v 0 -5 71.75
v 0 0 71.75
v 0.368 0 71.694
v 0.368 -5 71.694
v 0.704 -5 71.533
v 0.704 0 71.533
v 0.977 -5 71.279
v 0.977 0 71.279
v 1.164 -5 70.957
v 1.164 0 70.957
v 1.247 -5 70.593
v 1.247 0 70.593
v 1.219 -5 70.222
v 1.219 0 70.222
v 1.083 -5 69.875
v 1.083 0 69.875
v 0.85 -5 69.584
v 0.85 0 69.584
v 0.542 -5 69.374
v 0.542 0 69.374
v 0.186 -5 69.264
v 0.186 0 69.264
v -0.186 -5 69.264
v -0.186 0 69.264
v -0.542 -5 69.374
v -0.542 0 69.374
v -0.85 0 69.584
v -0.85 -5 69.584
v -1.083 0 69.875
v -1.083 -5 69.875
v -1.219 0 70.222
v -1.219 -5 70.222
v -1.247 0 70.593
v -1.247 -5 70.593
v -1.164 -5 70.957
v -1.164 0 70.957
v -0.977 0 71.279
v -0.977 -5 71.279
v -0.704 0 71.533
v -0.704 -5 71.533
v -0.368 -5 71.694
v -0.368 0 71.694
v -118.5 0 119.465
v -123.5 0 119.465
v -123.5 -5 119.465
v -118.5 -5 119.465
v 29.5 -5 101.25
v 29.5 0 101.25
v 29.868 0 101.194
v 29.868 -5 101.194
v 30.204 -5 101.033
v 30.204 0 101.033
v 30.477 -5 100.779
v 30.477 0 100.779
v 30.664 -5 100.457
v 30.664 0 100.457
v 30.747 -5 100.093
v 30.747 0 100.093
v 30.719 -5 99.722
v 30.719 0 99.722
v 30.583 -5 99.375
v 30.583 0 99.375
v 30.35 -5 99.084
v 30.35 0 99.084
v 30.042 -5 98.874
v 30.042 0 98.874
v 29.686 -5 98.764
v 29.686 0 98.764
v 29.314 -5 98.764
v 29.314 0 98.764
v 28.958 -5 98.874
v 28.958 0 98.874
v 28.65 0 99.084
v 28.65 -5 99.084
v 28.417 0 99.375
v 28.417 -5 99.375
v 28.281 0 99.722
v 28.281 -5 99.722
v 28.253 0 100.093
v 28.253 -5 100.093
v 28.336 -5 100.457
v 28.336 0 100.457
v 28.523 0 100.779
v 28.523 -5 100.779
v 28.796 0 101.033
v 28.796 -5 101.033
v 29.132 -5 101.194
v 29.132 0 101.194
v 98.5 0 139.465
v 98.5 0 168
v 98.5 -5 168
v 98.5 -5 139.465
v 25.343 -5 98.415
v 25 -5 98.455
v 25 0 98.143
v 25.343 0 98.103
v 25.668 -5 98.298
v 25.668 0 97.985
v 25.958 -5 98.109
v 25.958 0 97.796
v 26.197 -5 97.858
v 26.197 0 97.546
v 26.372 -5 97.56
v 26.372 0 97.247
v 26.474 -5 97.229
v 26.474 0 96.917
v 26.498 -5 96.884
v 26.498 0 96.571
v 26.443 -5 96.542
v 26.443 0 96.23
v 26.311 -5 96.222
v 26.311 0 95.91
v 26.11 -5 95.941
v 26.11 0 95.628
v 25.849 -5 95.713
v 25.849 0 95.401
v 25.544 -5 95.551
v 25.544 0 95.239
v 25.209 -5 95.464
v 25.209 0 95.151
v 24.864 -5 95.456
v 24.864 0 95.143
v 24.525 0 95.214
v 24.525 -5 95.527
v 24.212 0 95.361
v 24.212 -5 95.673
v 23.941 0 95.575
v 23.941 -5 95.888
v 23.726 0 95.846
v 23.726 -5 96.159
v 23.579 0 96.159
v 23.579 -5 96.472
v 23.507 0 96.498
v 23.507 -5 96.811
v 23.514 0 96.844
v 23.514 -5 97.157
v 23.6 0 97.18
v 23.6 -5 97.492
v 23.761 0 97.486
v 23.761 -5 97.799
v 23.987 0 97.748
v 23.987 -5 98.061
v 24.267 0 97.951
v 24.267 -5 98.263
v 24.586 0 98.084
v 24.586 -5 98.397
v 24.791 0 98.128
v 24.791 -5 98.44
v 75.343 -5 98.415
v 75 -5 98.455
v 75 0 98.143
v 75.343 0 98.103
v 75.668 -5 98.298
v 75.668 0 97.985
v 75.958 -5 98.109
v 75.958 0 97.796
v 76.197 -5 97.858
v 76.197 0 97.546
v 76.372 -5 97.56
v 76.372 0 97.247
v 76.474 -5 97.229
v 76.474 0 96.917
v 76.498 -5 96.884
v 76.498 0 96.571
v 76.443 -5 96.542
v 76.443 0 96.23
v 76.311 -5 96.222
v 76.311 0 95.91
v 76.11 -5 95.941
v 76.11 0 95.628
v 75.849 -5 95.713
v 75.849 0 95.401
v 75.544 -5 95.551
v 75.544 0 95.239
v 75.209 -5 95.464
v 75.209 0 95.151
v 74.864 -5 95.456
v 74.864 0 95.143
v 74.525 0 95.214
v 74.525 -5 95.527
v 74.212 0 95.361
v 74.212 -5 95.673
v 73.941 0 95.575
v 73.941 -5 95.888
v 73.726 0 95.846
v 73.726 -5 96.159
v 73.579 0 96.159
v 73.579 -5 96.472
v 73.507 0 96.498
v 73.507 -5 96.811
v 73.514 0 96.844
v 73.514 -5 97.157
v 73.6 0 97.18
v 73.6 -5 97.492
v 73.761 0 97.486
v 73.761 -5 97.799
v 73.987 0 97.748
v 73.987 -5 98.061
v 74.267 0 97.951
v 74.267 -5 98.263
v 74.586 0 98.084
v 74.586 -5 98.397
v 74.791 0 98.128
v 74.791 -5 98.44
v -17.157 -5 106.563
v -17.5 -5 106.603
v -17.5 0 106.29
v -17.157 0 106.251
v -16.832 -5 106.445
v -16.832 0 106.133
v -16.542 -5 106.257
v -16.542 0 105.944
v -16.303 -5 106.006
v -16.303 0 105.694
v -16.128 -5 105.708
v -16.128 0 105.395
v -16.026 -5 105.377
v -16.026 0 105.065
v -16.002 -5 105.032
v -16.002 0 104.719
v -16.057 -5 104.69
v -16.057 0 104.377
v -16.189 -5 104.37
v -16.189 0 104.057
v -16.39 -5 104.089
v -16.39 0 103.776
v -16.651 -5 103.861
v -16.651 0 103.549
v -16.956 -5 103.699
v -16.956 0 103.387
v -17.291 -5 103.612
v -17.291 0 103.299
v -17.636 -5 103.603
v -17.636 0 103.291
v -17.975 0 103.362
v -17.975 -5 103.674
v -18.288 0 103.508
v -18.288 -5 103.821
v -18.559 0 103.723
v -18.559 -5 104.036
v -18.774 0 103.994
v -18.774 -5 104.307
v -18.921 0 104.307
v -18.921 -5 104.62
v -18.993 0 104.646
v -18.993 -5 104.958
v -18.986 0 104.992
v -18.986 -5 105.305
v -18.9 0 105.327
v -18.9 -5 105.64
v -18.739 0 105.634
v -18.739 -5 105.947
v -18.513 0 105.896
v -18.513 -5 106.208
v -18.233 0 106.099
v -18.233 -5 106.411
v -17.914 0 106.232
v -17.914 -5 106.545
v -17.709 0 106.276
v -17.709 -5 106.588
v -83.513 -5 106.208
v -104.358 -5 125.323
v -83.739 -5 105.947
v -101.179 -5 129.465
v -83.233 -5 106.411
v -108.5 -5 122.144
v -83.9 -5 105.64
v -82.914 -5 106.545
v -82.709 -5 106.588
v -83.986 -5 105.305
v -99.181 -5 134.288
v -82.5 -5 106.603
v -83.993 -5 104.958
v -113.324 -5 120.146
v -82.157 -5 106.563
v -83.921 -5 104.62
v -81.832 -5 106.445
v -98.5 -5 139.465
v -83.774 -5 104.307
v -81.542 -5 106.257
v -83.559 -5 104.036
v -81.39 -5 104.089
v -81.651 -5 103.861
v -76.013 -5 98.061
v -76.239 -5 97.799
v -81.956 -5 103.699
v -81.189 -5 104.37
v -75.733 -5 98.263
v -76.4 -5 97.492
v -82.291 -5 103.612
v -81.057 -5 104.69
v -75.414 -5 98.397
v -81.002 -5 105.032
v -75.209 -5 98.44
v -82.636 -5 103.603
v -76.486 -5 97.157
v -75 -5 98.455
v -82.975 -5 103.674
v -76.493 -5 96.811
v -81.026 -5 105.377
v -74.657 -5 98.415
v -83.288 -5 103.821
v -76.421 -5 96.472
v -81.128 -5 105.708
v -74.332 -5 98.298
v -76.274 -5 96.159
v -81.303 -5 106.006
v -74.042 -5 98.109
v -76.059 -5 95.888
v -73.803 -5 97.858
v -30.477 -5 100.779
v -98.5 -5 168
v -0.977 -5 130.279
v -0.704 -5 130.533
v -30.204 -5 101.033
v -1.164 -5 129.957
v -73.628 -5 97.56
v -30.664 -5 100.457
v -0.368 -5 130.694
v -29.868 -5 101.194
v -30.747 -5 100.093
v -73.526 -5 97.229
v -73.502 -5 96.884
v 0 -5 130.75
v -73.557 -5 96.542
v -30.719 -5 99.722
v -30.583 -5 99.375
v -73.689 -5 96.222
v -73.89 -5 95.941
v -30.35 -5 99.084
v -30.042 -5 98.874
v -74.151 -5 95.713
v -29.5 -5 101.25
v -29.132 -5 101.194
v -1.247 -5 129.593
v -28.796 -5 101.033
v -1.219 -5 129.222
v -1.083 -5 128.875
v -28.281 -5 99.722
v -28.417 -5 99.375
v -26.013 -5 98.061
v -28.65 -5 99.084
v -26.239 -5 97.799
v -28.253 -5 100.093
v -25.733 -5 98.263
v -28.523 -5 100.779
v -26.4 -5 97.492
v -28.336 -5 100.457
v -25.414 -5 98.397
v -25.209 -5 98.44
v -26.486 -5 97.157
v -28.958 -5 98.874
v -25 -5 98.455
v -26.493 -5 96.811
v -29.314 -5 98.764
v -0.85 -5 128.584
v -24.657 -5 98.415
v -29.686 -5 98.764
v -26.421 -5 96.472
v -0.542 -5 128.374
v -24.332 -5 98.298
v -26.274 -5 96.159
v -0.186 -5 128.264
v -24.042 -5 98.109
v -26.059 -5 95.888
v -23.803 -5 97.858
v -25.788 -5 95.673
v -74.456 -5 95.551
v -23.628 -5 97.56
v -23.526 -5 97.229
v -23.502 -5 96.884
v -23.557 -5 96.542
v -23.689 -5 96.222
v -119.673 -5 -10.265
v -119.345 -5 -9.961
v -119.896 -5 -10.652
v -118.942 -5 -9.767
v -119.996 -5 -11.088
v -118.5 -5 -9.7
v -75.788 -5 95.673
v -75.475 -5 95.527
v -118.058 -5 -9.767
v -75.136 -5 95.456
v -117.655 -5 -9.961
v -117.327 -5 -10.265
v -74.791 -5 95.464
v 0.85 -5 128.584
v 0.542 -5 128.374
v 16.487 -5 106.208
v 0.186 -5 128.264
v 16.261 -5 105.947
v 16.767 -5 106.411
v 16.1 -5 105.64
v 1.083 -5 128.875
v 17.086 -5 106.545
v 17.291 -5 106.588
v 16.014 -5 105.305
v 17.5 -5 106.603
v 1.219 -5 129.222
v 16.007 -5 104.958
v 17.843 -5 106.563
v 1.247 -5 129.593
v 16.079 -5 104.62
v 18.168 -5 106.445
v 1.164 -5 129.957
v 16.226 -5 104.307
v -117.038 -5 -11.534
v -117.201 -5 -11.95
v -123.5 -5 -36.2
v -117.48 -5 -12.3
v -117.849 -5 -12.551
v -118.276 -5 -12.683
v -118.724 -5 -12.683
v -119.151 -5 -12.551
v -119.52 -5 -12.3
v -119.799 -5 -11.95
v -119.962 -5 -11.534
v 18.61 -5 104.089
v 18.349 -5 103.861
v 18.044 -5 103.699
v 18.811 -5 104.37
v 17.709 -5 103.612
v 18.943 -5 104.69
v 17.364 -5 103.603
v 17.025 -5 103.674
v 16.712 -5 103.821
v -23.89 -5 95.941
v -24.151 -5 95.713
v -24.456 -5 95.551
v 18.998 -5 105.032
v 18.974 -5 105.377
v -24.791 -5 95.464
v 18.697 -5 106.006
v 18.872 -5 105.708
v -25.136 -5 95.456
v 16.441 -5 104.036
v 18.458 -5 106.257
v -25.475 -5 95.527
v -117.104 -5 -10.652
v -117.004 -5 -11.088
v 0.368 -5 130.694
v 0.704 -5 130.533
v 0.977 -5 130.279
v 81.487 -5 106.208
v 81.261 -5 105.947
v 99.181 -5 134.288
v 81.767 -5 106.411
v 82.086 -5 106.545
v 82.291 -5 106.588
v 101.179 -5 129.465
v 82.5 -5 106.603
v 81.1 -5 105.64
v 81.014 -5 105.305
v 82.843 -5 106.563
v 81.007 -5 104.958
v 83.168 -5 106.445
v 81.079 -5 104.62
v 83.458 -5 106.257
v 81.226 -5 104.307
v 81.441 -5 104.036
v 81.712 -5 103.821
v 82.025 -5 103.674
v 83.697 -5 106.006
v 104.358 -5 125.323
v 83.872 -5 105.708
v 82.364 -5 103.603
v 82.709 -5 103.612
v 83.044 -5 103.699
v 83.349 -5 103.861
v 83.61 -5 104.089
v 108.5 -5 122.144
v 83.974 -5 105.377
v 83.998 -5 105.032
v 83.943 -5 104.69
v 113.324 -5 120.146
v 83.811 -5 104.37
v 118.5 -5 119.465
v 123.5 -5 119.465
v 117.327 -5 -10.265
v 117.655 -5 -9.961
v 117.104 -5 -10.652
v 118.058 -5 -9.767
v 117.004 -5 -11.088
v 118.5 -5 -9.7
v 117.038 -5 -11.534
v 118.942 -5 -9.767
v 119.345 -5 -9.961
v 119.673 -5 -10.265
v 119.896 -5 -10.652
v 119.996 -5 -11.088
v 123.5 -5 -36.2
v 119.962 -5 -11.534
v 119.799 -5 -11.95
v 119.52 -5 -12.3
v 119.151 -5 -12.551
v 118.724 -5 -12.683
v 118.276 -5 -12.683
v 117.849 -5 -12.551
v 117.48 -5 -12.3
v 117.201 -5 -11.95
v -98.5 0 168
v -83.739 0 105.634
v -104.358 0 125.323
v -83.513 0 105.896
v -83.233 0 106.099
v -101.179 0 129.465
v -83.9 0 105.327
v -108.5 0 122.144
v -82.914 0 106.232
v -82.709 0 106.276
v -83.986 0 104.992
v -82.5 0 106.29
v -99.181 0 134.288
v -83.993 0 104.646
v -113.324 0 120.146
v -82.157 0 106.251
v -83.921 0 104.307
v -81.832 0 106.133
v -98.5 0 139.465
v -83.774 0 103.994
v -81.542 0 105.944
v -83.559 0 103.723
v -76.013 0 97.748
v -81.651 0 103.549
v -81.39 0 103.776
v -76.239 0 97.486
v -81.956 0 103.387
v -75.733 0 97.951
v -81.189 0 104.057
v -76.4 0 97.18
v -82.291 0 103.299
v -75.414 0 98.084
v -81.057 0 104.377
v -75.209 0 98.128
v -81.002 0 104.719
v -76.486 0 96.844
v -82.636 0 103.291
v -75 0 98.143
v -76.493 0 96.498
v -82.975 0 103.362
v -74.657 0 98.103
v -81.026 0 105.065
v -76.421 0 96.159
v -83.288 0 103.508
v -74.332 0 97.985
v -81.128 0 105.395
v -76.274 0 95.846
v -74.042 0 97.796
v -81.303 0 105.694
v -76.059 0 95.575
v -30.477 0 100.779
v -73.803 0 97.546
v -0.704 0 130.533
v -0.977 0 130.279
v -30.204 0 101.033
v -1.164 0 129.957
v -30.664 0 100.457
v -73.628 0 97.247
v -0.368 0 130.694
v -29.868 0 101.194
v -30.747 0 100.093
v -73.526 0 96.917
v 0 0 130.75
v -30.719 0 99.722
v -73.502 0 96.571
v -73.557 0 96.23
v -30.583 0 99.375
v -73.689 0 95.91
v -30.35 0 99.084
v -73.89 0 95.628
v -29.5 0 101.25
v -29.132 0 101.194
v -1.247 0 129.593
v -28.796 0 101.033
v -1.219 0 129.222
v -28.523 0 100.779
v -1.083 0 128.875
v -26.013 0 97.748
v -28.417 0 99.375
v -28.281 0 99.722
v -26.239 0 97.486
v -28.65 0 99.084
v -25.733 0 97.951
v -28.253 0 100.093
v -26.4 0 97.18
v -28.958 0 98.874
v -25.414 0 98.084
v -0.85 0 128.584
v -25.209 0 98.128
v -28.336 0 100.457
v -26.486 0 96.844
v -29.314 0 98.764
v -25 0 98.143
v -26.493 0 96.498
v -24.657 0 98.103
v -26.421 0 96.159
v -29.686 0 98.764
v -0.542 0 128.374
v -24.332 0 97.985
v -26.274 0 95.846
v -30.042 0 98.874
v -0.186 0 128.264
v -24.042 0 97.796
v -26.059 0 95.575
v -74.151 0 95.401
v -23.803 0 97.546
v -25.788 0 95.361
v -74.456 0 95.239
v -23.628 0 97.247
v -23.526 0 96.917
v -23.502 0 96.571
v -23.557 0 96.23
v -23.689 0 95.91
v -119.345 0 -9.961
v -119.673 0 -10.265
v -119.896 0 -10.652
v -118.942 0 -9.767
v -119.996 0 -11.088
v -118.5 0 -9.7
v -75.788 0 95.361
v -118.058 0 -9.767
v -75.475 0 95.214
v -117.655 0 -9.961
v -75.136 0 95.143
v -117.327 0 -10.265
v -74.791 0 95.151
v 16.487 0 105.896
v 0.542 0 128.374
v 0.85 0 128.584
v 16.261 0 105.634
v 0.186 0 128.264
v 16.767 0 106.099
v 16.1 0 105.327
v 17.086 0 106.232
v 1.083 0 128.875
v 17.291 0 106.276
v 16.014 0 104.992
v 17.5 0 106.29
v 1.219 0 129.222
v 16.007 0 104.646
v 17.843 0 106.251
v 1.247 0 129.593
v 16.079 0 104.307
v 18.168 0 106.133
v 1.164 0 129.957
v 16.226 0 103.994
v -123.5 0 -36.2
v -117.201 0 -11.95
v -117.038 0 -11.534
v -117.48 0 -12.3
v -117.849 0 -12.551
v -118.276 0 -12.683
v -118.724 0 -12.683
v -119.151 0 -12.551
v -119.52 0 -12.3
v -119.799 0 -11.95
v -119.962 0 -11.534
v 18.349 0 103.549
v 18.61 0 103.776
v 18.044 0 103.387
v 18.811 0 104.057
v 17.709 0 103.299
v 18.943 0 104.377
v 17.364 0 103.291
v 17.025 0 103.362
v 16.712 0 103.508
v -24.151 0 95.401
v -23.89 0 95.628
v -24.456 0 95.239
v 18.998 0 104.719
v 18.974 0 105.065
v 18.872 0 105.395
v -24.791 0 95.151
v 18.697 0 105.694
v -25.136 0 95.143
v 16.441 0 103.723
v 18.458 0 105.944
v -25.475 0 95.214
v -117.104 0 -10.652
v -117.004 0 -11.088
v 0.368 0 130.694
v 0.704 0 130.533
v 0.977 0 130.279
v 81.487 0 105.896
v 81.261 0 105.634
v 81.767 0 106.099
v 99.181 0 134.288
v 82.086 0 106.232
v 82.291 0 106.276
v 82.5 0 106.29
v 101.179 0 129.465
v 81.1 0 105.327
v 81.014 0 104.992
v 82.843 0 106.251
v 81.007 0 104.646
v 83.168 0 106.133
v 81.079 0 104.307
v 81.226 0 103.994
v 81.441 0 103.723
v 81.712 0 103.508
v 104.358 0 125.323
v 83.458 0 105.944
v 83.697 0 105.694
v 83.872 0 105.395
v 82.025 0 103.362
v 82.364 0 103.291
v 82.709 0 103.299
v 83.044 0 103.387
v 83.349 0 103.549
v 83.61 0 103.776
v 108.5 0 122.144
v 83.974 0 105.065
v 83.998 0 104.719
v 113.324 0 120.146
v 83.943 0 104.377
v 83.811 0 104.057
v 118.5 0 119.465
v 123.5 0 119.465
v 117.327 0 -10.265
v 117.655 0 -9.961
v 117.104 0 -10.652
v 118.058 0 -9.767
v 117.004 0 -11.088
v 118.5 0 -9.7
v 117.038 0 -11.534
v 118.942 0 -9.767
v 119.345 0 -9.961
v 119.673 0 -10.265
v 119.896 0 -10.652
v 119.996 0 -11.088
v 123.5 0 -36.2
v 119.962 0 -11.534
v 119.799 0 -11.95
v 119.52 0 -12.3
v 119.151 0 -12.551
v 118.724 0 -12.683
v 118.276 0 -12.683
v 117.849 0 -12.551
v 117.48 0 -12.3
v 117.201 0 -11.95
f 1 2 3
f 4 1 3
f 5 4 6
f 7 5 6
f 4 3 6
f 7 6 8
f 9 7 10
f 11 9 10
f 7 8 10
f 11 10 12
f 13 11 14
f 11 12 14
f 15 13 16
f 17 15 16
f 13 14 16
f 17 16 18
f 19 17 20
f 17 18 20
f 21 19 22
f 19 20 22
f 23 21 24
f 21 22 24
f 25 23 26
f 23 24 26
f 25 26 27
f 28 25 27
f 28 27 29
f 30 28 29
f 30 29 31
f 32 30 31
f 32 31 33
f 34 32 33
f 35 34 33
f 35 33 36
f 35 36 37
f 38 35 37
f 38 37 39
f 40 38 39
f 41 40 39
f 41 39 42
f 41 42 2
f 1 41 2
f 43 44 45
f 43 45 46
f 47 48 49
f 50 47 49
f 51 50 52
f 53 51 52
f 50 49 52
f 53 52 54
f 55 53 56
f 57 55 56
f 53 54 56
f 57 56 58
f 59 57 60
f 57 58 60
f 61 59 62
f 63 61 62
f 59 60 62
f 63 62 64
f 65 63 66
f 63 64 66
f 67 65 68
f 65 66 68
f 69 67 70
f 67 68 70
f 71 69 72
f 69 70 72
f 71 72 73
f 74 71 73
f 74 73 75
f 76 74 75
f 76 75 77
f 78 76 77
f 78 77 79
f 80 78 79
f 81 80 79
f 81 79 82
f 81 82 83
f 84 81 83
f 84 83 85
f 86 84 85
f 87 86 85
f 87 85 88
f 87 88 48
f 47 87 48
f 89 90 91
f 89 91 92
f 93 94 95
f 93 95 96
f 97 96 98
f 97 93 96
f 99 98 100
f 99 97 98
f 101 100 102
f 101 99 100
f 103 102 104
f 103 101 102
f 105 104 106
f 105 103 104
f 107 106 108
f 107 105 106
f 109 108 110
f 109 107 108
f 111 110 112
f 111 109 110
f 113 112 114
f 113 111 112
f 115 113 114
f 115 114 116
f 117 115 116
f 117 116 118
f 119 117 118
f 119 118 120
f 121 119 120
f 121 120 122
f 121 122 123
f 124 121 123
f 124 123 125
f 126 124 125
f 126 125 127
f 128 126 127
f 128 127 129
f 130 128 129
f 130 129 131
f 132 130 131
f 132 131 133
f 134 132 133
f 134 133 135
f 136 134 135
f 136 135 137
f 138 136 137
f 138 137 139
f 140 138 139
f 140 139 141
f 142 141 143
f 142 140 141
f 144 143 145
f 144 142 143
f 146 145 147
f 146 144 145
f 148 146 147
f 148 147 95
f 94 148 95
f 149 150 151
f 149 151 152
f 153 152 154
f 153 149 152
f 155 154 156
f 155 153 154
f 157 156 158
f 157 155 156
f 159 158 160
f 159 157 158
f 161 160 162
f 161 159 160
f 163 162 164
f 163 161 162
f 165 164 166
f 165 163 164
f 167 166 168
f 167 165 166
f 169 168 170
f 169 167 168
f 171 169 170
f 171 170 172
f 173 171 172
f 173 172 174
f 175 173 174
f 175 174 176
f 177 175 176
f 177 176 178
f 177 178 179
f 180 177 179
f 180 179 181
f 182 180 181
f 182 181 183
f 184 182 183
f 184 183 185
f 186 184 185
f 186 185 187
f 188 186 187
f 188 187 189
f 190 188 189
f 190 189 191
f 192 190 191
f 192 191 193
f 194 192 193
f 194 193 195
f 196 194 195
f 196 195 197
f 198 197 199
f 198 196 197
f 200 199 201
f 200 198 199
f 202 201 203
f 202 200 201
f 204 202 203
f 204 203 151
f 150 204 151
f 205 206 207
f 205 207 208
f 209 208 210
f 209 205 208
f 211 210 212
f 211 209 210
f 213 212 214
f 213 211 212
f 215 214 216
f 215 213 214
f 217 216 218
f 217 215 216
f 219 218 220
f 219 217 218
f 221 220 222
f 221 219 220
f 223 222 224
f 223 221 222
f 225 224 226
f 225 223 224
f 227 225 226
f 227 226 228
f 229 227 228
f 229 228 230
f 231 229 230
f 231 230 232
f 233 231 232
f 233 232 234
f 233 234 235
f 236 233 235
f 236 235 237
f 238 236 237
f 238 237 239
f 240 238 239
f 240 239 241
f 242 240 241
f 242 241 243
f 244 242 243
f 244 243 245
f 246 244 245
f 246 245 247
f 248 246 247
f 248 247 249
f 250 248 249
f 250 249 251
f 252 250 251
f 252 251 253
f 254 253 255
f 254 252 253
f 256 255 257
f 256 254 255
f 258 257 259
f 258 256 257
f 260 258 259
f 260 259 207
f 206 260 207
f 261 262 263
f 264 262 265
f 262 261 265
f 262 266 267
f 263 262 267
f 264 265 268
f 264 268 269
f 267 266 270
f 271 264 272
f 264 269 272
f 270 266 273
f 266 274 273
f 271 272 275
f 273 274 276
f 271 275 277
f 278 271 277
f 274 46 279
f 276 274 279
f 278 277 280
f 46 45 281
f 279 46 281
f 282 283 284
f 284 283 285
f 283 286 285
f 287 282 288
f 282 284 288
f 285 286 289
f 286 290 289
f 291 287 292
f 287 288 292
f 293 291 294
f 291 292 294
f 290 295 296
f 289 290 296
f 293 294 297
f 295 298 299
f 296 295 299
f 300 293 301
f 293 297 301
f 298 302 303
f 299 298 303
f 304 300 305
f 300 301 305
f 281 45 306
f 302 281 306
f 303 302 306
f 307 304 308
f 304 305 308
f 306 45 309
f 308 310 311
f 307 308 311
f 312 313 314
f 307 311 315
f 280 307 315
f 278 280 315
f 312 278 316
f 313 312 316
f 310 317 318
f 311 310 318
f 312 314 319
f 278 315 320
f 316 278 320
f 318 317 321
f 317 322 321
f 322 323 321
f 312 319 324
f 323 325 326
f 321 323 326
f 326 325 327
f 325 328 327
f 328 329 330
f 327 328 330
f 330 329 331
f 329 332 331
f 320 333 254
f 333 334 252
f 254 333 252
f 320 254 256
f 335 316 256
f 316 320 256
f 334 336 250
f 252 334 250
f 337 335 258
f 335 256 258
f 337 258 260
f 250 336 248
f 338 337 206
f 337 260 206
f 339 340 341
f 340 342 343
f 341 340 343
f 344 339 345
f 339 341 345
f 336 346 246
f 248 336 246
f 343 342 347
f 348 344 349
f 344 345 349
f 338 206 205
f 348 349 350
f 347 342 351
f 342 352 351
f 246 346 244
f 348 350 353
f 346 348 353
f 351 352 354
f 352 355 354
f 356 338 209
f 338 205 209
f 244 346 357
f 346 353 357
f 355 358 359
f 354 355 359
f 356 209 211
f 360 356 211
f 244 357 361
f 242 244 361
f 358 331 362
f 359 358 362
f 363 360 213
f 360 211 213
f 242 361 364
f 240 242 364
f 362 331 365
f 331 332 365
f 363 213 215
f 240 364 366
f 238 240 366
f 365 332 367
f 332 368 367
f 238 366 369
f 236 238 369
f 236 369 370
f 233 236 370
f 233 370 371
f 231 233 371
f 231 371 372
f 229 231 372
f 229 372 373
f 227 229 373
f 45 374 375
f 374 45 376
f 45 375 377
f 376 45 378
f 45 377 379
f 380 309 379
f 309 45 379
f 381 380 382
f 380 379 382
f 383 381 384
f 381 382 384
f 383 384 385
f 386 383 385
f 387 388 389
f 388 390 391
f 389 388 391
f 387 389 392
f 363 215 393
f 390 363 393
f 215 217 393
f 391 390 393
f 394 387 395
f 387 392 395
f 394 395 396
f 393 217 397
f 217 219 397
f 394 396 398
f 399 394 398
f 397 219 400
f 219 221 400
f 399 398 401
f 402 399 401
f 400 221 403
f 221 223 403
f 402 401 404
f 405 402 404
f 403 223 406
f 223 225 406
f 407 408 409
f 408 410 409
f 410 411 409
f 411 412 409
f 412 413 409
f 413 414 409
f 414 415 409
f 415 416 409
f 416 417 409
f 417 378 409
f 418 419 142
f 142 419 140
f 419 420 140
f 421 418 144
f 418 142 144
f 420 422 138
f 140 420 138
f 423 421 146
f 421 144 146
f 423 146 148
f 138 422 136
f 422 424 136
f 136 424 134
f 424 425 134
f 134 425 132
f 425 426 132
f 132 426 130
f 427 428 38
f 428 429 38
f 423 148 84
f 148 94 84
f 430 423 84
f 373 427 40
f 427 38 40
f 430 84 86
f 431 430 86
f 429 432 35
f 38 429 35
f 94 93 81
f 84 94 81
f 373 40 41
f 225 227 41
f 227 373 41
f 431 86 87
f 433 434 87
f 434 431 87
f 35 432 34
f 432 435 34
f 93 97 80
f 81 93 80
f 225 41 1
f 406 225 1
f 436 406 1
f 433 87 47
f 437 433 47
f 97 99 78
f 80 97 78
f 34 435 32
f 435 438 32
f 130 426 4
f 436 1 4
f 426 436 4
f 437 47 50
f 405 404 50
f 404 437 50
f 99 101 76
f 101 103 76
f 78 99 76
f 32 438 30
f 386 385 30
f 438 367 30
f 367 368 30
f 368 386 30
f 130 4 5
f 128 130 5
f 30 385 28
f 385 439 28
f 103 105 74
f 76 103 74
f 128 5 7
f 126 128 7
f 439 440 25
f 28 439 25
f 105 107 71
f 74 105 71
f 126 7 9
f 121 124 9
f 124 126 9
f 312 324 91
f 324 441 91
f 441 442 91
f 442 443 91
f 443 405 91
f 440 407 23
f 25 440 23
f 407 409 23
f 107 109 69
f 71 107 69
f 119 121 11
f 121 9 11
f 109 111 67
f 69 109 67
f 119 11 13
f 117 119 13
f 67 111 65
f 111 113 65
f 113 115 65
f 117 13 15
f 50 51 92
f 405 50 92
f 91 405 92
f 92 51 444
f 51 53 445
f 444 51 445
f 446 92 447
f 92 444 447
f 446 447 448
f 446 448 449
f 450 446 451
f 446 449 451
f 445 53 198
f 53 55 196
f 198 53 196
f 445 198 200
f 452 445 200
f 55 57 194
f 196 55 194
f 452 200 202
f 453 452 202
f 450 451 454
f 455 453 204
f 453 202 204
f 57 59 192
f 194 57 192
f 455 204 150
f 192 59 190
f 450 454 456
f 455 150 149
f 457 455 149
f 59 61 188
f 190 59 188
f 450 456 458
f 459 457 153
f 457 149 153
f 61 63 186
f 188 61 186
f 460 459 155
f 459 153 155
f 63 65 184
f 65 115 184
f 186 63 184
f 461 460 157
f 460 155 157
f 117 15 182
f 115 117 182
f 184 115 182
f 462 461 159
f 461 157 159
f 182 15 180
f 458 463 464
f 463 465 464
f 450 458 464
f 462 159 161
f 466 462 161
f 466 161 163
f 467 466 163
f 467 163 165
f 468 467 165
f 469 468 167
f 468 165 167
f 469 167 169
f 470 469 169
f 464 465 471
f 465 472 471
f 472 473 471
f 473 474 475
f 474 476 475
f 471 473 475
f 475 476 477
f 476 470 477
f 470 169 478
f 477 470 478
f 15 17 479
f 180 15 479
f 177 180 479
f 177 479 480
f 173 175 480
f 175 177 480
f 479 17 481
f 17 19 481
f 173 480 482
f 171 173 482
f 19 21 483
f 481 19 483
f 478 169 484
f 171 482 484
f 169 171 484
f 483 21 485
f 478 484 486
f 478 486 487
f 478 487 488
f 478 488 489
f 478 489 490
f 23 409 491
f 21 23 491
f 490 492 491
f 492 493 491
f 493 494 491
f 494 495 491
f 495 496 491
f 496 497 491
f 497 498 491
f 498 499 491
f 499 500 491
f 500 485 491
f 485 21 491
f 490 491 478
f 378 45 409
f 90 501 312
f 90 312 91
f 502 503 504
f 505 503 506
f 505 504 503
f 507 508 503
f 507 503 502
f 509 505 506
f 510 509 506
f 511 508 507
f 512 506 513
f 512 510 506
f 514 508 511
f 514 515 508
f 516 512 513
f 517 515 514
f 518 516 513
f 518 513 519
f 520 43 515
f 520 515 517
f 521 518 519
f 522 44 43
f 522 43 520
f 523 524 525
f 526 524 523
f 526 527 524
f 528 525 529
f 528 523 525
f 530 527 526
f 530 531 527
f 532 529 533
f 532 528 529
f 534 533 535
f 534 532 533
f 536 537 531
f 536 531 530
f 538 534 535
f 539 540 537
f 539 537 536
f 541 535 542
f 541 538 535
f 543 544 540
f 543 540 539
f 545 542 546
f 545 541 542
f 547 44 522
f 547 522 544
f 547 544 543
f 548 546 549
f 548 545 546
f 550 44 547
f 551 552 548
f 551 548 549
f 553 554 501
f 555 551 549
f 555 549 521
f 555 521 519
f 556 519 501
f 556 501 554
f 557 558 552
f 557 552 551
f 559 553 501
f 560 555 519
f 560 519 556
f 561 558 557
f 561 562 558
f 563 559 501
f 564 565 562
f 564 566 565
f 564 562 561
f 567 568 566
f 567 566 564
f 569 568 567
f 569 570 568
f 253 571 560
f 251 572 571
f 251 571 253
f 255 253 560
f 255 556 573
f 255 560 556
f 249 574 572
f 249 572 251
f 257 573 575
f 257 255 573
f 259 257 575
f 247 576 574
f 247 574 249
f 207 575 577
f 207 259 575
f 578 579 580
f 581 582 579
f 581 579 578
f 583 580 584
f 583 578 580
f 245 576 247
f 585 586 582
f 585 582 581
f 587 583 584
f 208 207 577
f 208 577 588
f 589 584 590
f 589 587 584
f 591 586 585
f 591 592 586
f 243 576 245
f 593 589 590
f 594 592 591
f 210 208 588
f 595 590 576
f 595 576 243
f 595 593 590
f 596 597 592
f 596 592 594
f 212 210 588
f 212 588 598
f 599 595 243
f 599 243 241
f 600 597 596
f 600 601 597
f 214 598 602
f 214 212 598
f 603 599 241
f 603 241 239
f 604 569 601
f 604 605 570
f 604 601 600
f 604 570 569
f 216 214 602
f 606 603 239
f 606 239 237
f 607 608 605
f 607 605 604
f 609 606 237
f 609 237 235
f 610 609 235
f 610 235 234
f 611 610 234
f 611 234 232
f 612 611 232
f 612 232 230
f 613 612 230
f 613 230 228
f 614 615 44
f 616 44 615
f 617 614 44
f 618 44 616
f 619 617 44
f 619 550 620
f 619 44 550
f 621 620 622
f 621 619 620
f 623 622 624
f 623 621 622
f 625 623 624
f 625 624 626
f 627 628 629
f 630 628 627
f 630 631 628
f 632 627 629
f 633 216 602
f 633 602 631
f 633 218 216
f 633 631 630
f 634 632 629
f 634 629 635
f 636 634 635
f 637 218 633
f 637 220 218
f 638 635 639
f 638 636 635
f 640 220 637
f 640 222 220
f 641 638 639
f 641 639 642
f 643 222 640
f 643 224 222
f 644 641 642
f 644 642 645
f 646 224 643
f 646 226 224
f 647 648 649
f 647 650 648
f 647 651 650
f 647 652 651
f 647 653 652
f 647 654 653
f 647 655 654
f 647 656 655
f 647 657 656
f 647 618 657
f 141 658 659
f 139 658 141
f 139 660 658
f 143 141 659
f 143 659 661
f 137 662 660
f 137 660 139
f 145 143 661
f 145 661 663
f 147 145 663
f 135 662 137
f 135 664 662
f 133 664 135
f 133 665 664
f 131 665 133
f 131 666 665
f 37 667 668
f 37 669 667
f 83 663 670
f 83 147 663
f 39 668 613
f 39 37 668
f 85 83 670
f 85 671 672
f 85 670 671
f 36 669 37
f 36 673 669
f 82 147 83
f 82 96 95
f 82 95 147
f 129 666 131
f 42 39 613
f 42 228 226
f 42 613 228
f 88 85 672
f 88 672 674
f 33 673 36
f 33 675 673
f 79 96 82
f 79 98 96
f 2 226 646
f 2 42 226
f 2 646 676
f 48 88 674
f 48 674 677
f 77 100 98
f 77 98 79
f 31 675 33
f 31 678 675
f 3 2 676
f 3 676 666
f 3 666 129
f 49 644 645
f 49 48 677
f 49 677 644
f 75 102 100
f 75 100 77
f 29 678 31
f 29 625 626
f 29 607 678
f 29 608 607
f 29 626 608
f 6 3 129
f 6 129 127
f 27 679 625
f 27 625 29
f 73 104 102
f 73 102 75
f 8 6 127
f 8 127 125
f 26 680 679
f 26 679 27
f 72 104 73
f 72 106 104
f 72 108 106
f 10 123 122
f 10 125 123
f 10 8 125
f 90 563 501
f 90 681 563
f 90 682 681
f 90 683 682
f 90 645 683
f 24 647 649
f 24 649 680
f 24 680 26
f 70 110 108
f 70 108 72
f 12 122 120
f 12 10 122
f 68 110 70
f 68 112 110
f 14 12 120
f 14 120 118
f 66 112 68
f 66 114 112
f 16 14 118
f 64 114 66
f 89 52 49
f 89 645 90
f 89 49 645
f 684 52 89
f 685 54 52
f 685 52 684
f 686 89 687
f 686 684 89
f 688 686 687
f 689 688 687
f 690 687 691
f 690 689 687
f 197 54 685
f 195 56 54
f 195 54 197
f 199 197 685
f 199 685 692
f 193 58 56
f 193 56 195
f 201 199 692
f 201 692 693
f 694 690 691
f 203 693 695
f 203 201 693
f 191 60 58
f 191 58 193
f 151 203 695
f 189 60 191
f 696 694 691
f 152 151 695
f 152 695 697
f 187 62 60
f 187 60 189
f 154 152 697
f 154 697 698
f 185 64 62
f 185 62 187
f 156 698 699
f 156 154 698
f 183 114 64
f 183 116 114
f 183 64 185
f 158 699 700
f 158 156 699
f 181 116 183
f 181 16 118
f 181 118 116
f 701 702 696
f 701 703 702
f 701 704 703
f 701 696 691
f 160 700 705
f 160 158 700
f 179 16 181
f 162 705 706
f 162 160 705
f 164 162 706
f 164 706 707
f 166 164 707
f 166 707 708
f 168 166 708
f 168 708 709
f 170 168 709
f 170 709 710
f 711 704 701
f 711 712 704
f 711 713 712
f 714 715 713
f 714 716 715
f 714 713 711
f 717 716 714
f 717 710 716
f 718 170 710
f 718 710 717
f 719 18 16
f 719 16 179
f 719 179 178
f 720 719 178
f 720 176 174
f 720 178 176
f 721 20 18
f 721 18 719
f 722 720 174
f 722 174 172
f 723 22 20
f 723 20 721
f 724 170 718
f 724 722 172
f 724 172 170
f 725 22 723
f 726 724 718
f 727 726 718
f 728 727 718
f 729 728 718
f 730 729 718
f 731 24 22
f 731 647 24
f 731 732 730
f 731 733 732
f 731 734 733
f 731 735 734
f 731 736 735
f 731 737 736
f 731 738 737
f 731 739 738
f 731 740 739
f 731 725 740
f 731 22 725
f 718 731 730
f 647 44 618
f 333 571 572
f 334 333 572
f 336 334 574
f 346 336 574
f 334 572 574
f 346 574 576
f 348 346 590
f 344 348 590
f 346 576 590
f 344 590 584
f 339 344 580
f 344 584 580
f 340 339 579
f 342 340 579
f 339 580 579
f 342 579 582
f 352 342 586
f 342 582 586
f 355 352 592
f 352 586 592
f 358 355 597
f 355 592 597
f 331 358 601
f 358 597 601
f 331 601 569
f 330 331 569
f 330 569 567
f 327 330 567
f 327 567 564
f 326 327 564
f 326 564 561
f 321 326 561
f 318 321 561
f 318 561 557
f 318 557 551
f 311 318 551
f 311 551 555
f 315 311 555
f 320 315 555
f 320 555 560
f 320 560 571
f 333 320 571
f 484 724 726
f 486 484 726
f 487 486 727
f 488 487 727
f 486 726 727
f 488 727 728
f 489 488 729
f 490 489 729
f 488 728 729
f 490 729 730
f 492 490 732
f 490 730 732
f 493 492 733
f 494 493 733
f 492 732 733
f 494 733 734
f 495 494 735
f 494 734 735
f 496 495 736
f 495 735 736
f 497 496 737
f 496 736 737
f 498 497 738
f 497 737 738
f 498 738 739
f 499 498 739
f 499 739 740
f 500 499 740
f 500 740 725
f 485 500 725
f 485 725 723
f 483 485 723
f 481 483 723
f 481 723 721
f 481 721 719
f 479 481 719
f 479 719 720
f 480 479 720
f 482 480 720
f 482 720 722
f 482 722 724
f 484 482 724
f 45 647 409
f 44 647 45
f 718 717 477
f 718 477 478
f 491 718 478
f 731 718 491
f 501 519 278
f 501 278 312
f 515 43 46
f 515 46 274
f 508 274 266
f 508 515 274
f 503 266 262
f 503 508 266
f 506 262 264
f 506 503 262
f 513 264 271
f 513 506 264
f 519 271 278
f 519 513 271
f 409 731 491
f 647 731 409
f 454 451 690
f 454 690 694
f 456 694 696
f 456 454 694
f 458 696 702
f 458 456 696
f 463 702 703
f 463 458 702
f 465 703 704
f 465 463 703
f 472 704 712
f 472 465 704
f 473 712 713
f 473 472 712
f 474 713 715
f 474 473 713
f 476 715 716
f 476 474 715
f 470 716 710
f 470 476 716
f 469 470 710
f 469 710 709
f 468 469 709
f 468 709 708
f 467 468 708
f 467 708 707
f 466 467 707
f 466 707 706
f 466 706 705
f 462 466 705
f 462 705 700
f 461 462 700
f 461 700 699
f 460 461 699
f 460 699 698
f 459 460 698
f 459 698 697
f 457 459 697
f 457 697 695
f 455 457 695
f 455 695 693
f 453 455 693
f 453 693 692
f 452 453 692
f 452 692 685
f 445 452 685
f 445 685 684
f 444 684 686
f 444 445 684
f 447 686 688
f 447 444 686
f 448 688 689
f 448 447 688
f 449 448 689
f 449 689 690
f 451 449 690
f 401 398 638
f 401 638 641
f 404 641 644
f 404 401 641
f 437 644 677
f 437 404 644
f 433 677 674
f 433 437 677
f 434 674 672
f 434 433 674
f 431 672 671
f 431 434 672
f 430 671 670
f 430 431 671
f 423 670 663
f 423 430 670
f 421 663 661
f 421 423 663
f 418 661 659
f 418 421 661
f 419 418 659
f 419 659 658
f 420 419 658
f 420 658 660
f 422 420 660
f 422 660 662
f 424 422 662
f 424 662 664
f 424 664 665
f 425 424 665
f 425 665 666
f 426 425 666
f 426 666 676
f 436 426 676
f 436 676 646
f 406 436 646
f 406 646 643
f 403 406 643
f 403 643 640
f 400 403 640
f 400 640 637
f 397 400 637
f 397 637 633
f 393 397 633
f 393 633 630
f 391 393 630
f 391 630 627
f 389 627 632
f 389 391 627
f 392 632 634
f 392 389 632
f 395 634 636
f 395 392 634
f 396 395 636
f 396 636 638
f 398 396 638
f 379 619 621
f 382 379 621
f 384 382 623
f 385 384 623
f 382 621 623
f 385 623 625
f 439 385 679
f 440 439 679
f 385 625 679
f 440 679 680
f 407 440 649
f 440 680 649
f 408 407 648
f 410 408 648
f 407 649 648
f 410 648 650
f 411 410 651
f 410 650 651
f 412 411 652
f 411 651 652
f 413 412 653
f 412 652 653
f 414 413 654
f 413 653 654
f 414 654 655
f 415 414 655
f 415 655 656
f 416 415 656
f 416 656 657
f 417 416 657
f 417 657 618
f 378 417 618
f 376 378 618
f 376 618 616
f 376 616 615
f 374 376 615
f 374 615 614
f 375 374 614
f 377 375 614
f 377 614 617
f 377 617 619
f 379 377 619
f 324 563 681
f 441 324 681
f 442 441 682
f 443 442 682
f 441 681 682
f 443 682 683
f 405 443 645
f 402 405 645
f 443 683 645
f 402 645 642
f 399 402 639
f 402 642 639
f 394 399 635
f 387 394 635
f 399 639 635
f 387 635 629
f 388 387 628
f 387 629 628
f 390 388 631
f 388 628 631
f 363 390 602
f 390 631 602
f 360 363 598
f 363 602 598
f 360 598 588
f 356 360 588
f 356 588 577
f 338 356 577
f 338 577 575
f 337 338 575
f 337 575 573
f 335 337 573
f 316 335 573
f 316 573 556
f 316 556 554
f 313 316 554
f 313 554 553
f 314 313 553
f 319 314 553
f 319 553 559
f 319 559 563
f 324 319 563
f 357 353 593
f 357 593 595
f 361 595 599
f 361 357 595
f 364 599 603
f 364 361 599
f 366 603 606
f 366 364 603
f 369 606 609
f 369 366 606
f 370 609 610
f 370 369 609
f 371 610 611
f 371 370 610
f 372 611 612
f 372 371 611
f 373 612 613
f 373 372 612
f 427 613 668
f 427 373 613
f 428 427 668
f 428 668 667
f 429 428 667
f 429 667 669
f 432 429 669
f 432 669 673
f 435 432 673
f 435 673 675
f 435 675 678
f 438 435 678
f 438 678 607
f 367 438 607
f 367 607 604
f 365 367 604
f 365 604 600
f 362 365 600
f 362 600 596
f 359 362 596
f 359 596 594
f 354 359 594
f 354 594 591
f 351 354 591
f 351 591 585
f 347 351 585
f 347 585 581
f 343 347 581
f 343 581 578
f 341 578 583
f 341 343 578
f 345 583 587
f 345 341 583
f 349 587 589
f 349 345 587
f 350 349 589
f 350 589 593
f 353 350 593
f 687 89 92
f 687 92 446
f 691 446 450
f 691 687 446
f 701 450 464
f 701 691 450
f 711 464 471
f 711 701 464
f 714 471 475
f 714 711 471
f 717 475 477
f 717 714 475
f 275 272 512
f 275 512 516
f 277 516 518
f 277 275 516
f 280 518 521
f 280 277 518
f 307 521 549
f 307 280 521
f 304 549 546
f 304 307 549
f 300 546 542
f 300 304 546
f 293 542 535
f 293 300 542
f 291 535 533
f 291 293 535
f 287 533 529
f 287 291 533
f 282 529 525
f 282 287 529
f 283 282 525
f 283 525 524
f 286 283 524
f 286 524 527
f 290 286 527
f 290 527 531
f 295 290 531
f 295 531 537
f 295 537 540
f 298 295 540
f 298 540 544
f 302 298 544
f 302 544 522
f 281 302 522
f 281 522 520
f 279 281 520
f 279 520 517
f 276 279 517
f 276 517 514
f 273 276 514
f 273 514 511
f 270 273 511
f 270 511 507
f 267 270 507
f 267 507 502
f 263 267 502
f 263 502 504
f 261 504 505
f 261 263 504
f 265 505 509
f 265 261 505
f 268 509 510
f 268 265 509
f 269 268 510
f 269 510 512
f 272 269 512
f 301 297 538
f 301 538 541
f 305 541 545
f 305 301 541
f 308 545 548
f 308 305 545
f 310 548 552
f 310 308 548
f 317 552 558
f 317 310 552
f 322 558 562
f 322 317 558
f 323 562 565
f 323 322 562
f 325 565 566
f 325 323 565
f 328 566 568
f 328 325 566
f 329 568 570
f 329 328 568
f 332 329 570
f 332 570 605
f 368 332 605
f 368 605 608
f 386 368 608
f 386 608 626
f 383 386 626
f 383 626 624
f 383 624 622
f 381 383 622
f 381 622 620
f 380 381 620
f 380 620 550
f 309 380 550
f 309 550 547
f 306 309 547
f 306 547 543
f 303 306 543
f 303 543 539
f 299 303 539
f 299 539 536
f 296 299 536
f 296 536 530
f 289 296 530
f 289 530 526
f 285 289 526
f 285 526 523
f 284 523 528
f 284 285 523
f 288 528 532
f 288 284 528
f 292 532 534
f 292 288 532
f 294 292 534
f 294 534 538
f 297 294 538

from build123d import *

# Parameters (mm, degrees)
BOSS_EXTRU_1_DEPTH      = 5
ESQUISSE2_R             = 1.5
ENL_V_MAT_EXTRU_1_DEPTH = 209.56953277
ESQUISSE4_R             = 1.25
ENL_V_MAT_EXTRU_3_DEPTH = 209.56953277
ESQUISSE5_R             = 1.5
ENL_V_MAT_EXTRU_6_DEPTH = 269.378676152


with BuildPart() as part:
    # Esquisse1 → Boss.-Extru.1 (new body)
    with BuildSketch(Plane(origin=(0, 0, 0), x_dir=(1, 0, 0), z_dir=(0, 1, 0))):
        with BuildLine():
            Line((123.5, -119.464880645), (123.5, 36.2))
            Line((123.5, 36.2), (-123.5, 36.2))
            Line((-123.5, 36.2), (-123.5, -119.464880645))
            Line((-123.5, -119.464880645), (-118.5, -119.464880645))
            ThreePointArc((-118.5, -119.464880645), (-104.357864376, -125.322745021), (-98.5, -139.464880645))
            Line((-98.5, -139.464880645), (-98.5, -168))
            Line((-98.5, -168), (98.5, -168))
            Line((98.5, -168), (98.5, -139.464880645))
            ThreePointArc((98.5, -139.464880645), (104.357864376, -125.322745021), (118.5, -119.464880645))
            Line((118.5, -119.464880645), (123.5, -119.464880645))
        make_face()
    extrude(amount=-BOSS_EXTRU_1_DEPTH)

    # Esquisse2 → Enlèv. mat.-Extru.1 (cut, through all)
    with BuildSketch(Plane(origin=(0, 0, 0), x_dir=(1, 0, 0), z_dir=(0, 1, 0))):
        with Locations(Location((-118.5, 11.2, 0), (0, 0, 270))):
            Circle(ESQUISSE2_R)
        with Locations(Location((118.5, 11.2, 0), (0, 0, 270))):
            Circle(ESQUISSE2_R)
    extrude(amount=-ENL_V_MAT_EXTRU_1_DEPTH, mode=Mode.SUBTRACT)

    # Esquisse4 → Enlèv. mat.-Extru.3 (cut, through all)
    with BuildSketch(Plane(origin=(0, 0, 0), x_dir=(1, 0, 0), z_dir=(0, 1, 0))):
        with Locations(Location((0, -129.5, 0), (0, 0, 270))):
            Circle(ESQUISSE4_R)
        with Locations(Location((29.5, -100, 0), (0, 0, 270))):
            Circle(ESQUISSE4_R)
        with Locations(Location((-29.5, -100, 0), (0, 0, 270))):
            Circle(ESQUISSE4_R)
        with Locations(Location((0, -70.5, 0), (0, 0, 270))):
            Circle(ESQUISSE4_R)
    extrude(amount=-ENL_V_MAT_EXTRU_3_DEPTH, mode=Mode.SUBTRACT)

    # Esquisse5 → Enlèv. mat.-Extru.6 (cut, through all)
    with BuildSketch(Plane(origin=(0, -179.424124514, 11.214007782), x_dir=(1, 0, 0), z_dir=(0, 0.9980525784828886, -0.06237828615518076))):
        with Locations(Location((-17.5, -104.583435434, 0), (0, 0, 270))):
            Circle(ESQUISSE5_R)
        with Locations(Location((-25, -96.451522388, 0), (0, 0, 270))):
            Circle(ESQUISSE5_R)
        with Locations(Location((-82.5, -104.583435434, 0), (0, 0, 270))):
            Circle(ESQUISSE5_R)
        with Locations(Location((-75, -96.451522388, 0), (0, 0, 270))):
            Circle(ESQUISSE5_R)
        with Locations(Location((17.5, -104.583435434, 0), (0, 0, 270))):
            Circle(ESQUISSE5_R)
        with Locations(Location((25, -96.451522388, 0), (0, 0, 270))):
            Circle(ESQUISSE5_R)
        with Locations(Location((75, -96.451522388, 0), (0, 0, 270))):
            Circle(ESQUISSE5_R)
        with Locations(Location((82.5, -104.583435434, 0), (0, 0, 270))):
            Circle(ESQUISSE5_R)
    extrude(amount=ENL_V_MAT_EXTRU_6_DEPTH, mode=Mode.SUBTRACT)


solid = part.part
